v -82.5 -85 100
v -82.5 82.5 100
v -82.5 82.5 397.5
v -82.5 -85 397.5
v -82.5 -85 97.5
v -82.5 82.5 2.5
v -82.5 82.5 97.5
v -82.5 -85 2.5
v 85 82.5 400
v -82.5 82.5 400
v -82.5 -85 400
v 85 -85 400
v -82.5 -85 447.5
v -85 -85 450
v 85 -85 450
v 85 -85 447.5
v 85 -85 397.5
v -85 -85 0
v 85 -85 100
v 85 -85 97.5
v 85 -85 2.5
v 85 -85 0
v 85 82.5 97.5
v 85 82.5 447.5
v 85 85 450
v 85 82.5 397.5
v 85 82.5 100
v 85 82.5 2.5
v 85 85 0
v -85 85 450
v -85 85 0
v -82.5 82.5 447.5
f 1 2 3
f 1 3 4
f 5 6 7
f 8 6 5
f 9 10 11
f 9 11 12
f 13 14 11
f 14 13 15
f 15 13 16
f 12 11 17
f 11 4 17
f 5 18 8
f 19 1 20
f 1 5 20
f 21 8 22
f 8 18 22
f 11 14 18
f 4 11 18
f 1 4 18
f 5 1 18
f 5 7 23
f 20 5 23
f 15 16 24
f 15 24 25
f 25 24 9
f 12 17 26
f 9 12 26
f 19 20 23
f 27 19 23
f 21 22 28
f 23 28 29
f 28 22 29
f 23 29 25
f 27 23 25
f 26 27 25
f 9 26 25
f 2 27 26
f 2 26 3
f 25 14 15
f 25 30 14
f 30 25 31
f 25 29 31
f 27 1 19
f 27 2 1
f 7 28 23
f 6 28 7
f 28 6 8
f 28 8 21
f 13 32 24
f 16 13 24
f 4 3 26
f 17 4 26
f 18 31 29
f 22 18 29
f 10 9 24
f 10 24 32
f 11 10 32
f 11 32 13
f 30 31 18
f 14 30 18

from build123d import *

# Parameters (mm, degrees)
F0_W        = 167.5
F0_H        = 85
F0_W_2      = 2.5
F0_H_2      = 2.5
F0_H_3      = 82.5
F1_DEPTH    = 100
F2_T        = -2.5
F3_W        = 2.5
F3_H        = 167.5
F3_W_2      = 167.5
F3_H_2      = 2.5
F4_DEPTH    = 300
F5_T        = 2.5
F5_T3_DEPTH = 172.5
F5_T5_DEPTH = 172.5
F5_T7_DEPTH = 100
F6_DEPTH    = 50
F7_T        = 2.5
F7_T3_DEPTH = 172.5
F7_T5_DEPTH = 172.5
F7_T7_DEPTH = 100
F7_T9_DEPTH = 302.5


# Not quite as in the source:
# - a shell that OpenCascade refuses in one call is made with other operations: the cavity is built on its own and cut out


with BuildPart() as f1:
    # F0 (on Top) → F1 (new body)
    with BuildSketch(Plane.XY):
        Polygon((82.5, -85), (85, -85), (85, 82.5), (82.5, 82.5), (82.5, 0), align=None)
        with Locations((-1.25, -42.5)):
            Rectangle(F0_W, F0_H)
        with Locations((83.75, 83.75)):
            Rectangle(F0_W_2, F0_H_2)
        with Locations((-1.25, 41.25)):
            Rectangle(F0_W, F0_H_3)
        with Locations((-1.25, 83.75)):
            Rectangle(F0_W, F0_H_2)
    extrude(amount=F1_DEPTH)

    # F2
    f2_openings = [f1.faces().sort_by_distance(p)[0] for p in [
        (85, 0, 50),
        (0, -85, 50),
    ]]
    offset(amount=F2_T, openings=f2_openings)

    # F3 (on face) → F4 (join)
    with BuildSketch(Plane.XY.offset(100)):
        with Locations((-83.75, -1.25)):
            Rectangle(F3_W, F3_H)
        with Locations((1.25, -1.25)):
            Rectangle(F3_W_2, F3_H)
        with Locations((-83.75, 83.75)):
            Rectangle(F3_W, F3_H_2)
        with Locations((1.25, 83.75)):
            Rectangle(F3_W_2, F3_H_2)
    extrude(amount=F4_DEPTH)

    # F5: shell of thickness 2.5, made by hand


with BuildPart() as f5_core1:
    # F5_t2: copy of F1
    add(f1.part)

    # the walls: a layer under each face that stays
    f5_faces = [f5_core1.faces().sort_by_distance(p)[0] for p in [
        (0, 85, 200),
        (0, 0, 0),
        (1.25, -1.25, 2.5),
        (1.25, 82.5, 50),
        (-82.5, -1.25, 50),
        (1.25, -1.25, 97.5),
        (-85, 0, 200),
        (0, 0, 400),
    ]]
    thicken(f5_faces, amount=-F5_T, mode=Mode.SUBTRACT)

    # F5_s4 → F5_t3 (cut)
    with BuildSketch(Plane.YZ.offset(-85)):
        Polygon((82.475, 2.525), (82.5, 0), (85, 0), (85, 2.5), align=None)
        Polygon((82.475, 97.475), (85, 97.5), (85, 100), (82.5, 100), align=None)
    extrude(amount=F5_T3_DEPTH, mode=Mode.SUBTRACT)

    # F5_s6 → F5_t5 (cut)
    with BuildSketch(Plane.XZ.offset(-85)):
        Polygon((-82.475, 2.525), (-82.5, 0), (-85, 0), (-85, 2.5), align=None)
        Polygon((-82.475, 97.475), (-85, 97.5), (-85, 100), (-82.5, 100), align=None)
    extrude(amount=F5_T5_DEPTH, mode=Mode.SUBTRACT)

    # F5_s8 → F5_t7 (cut)
    with BuildSketch(Plane.XY):
        Polygon((-82.475, 82.475), (-82.5, 85), (-85, 85), (-85, 82.5), align=None)
    extrude(amount=F5_T7_DEPTH, mode=Mode.SUBTRACT)


with BuildPart() as f1_1:
    add(f1.part)

    # what is left inside the walls is the cavity
    f5_cavity = [f5_core1.part.solids().sort_by_distance(p)[0] for p in [
        (1.25, 82.475, 298.333333),
    ]]
    add(f5_cavity, mode=Mode.SUBTRACT)

    # F6 (add): a face of the model
    f6_faces = [f1_1.faces().sort_by_distance(p)[0] for p in [
        (0, 0, 400),
    ]]
    extrude(f6_faces, amount=F6_DEPTH)

    # F7: shell of thickness 2.5, made by hand


with BuildPart() as f7_core1:
    # F7_t2: copy of F1
    add(f1_1.part)

    # the walls: a layer under each face that stays
    f7_faces = [f7_core1.faces().sort_by_distance(p)[0] for p in [
        (0, 85, 225),
        (0, 0, 0),
        (1.25, -1.25, 2.5),
        (1.25, 82.5, 50),
        (-82.5, -1.25, 50),
        (1.25, -1.25, 97.5),
        (1.25, -1.25, 100),
        (1.25, 82.5, 248.75),
        (-82.5, -1.25, 248.75),
        (1.25, -1.25, 397.5),
        (-85, 0, 225),
        (0, 0, 450),
    ]]
    thicken(f7_faces, amount=-F7_T, mode=Mode.SUBTRACT)

    # F7_s4 → F7_t3 (cut)
    with BuildSketch(Plane.YZ.offset(-85)):
        Polygon((82.475, 2.525), (82.5, 0), (85, 0), (85, 2.5), align=None)
        Polygon((82.475, 97.475), (85, 97.5), (85, 100), (82.5, 100), align=None)
        Polygon((82.475, 100.025), (82.5, 97.5), (85, 97.5), (85, 100), align=None)
        Polygon((82.475, 397.475), (85, 397.5), (85, 400), (82.5, 400), align=None)
    extrude(amount=F7_T3_DEPTH, mode=Mode.SUBTRACT)

    # F7_s6 → F7_t5 (cut)
    with BuildSketch(Plane.XZ.offset(-85)):
        Polygon((-82.475, 2.525), (-82.5, 0), (-85, 0), (-85, 2.5), align=None)
        Polygon((-82.475, 97.475), (-85, 97.5), (-85, 100), (-82.5, 100), align=None)
        Polygon((-82.475, 100.025), (-82.5, 97.5), (-85, 97.5), (-85, 100), align=None)
        Polygon((-82.475, 397.475), (-85, 397.5), (-85, 400), (-82.5, 400), align=None)
    extrude(amount=F7_T5_DEPTH, mode=Mode.SUBTRACT)

    # F7_s8 → F7_t7 (cut)
    with BuildSketch(Plane.XY):
        Polygon((-82.475, 82.475), (-82.5, 85), (-85, 85), (-85, 82.5), align=None)
    extrude(amount=F7_T7_DEPTH, mode=Mode.SUBTRACT)

    # F7_s10 → F7_t9 (cut)
    with BuildSketch(Plane.XY.offset(97.5)):
        Polygon((-82.475, 82.475), (-82.5, 85), (-85, 85), (-85, 82.5), align=None)
    extrude(amount=F7_T9_DEPTH, mode=Mode.SUBTRACT)


with BuildPart() as f1_2:
    add(f1_1.part)

    # what is left inside the walls is the cavity
    f7_cavity = [f7_core1.part.solids().sort_by_distance(p)[0] for p in [
        (1.25, -29.166667, 447.475),
    ]]
    add(f7_cavity, mode=Mode.SUBTRACT)


solid = f1_2.part
